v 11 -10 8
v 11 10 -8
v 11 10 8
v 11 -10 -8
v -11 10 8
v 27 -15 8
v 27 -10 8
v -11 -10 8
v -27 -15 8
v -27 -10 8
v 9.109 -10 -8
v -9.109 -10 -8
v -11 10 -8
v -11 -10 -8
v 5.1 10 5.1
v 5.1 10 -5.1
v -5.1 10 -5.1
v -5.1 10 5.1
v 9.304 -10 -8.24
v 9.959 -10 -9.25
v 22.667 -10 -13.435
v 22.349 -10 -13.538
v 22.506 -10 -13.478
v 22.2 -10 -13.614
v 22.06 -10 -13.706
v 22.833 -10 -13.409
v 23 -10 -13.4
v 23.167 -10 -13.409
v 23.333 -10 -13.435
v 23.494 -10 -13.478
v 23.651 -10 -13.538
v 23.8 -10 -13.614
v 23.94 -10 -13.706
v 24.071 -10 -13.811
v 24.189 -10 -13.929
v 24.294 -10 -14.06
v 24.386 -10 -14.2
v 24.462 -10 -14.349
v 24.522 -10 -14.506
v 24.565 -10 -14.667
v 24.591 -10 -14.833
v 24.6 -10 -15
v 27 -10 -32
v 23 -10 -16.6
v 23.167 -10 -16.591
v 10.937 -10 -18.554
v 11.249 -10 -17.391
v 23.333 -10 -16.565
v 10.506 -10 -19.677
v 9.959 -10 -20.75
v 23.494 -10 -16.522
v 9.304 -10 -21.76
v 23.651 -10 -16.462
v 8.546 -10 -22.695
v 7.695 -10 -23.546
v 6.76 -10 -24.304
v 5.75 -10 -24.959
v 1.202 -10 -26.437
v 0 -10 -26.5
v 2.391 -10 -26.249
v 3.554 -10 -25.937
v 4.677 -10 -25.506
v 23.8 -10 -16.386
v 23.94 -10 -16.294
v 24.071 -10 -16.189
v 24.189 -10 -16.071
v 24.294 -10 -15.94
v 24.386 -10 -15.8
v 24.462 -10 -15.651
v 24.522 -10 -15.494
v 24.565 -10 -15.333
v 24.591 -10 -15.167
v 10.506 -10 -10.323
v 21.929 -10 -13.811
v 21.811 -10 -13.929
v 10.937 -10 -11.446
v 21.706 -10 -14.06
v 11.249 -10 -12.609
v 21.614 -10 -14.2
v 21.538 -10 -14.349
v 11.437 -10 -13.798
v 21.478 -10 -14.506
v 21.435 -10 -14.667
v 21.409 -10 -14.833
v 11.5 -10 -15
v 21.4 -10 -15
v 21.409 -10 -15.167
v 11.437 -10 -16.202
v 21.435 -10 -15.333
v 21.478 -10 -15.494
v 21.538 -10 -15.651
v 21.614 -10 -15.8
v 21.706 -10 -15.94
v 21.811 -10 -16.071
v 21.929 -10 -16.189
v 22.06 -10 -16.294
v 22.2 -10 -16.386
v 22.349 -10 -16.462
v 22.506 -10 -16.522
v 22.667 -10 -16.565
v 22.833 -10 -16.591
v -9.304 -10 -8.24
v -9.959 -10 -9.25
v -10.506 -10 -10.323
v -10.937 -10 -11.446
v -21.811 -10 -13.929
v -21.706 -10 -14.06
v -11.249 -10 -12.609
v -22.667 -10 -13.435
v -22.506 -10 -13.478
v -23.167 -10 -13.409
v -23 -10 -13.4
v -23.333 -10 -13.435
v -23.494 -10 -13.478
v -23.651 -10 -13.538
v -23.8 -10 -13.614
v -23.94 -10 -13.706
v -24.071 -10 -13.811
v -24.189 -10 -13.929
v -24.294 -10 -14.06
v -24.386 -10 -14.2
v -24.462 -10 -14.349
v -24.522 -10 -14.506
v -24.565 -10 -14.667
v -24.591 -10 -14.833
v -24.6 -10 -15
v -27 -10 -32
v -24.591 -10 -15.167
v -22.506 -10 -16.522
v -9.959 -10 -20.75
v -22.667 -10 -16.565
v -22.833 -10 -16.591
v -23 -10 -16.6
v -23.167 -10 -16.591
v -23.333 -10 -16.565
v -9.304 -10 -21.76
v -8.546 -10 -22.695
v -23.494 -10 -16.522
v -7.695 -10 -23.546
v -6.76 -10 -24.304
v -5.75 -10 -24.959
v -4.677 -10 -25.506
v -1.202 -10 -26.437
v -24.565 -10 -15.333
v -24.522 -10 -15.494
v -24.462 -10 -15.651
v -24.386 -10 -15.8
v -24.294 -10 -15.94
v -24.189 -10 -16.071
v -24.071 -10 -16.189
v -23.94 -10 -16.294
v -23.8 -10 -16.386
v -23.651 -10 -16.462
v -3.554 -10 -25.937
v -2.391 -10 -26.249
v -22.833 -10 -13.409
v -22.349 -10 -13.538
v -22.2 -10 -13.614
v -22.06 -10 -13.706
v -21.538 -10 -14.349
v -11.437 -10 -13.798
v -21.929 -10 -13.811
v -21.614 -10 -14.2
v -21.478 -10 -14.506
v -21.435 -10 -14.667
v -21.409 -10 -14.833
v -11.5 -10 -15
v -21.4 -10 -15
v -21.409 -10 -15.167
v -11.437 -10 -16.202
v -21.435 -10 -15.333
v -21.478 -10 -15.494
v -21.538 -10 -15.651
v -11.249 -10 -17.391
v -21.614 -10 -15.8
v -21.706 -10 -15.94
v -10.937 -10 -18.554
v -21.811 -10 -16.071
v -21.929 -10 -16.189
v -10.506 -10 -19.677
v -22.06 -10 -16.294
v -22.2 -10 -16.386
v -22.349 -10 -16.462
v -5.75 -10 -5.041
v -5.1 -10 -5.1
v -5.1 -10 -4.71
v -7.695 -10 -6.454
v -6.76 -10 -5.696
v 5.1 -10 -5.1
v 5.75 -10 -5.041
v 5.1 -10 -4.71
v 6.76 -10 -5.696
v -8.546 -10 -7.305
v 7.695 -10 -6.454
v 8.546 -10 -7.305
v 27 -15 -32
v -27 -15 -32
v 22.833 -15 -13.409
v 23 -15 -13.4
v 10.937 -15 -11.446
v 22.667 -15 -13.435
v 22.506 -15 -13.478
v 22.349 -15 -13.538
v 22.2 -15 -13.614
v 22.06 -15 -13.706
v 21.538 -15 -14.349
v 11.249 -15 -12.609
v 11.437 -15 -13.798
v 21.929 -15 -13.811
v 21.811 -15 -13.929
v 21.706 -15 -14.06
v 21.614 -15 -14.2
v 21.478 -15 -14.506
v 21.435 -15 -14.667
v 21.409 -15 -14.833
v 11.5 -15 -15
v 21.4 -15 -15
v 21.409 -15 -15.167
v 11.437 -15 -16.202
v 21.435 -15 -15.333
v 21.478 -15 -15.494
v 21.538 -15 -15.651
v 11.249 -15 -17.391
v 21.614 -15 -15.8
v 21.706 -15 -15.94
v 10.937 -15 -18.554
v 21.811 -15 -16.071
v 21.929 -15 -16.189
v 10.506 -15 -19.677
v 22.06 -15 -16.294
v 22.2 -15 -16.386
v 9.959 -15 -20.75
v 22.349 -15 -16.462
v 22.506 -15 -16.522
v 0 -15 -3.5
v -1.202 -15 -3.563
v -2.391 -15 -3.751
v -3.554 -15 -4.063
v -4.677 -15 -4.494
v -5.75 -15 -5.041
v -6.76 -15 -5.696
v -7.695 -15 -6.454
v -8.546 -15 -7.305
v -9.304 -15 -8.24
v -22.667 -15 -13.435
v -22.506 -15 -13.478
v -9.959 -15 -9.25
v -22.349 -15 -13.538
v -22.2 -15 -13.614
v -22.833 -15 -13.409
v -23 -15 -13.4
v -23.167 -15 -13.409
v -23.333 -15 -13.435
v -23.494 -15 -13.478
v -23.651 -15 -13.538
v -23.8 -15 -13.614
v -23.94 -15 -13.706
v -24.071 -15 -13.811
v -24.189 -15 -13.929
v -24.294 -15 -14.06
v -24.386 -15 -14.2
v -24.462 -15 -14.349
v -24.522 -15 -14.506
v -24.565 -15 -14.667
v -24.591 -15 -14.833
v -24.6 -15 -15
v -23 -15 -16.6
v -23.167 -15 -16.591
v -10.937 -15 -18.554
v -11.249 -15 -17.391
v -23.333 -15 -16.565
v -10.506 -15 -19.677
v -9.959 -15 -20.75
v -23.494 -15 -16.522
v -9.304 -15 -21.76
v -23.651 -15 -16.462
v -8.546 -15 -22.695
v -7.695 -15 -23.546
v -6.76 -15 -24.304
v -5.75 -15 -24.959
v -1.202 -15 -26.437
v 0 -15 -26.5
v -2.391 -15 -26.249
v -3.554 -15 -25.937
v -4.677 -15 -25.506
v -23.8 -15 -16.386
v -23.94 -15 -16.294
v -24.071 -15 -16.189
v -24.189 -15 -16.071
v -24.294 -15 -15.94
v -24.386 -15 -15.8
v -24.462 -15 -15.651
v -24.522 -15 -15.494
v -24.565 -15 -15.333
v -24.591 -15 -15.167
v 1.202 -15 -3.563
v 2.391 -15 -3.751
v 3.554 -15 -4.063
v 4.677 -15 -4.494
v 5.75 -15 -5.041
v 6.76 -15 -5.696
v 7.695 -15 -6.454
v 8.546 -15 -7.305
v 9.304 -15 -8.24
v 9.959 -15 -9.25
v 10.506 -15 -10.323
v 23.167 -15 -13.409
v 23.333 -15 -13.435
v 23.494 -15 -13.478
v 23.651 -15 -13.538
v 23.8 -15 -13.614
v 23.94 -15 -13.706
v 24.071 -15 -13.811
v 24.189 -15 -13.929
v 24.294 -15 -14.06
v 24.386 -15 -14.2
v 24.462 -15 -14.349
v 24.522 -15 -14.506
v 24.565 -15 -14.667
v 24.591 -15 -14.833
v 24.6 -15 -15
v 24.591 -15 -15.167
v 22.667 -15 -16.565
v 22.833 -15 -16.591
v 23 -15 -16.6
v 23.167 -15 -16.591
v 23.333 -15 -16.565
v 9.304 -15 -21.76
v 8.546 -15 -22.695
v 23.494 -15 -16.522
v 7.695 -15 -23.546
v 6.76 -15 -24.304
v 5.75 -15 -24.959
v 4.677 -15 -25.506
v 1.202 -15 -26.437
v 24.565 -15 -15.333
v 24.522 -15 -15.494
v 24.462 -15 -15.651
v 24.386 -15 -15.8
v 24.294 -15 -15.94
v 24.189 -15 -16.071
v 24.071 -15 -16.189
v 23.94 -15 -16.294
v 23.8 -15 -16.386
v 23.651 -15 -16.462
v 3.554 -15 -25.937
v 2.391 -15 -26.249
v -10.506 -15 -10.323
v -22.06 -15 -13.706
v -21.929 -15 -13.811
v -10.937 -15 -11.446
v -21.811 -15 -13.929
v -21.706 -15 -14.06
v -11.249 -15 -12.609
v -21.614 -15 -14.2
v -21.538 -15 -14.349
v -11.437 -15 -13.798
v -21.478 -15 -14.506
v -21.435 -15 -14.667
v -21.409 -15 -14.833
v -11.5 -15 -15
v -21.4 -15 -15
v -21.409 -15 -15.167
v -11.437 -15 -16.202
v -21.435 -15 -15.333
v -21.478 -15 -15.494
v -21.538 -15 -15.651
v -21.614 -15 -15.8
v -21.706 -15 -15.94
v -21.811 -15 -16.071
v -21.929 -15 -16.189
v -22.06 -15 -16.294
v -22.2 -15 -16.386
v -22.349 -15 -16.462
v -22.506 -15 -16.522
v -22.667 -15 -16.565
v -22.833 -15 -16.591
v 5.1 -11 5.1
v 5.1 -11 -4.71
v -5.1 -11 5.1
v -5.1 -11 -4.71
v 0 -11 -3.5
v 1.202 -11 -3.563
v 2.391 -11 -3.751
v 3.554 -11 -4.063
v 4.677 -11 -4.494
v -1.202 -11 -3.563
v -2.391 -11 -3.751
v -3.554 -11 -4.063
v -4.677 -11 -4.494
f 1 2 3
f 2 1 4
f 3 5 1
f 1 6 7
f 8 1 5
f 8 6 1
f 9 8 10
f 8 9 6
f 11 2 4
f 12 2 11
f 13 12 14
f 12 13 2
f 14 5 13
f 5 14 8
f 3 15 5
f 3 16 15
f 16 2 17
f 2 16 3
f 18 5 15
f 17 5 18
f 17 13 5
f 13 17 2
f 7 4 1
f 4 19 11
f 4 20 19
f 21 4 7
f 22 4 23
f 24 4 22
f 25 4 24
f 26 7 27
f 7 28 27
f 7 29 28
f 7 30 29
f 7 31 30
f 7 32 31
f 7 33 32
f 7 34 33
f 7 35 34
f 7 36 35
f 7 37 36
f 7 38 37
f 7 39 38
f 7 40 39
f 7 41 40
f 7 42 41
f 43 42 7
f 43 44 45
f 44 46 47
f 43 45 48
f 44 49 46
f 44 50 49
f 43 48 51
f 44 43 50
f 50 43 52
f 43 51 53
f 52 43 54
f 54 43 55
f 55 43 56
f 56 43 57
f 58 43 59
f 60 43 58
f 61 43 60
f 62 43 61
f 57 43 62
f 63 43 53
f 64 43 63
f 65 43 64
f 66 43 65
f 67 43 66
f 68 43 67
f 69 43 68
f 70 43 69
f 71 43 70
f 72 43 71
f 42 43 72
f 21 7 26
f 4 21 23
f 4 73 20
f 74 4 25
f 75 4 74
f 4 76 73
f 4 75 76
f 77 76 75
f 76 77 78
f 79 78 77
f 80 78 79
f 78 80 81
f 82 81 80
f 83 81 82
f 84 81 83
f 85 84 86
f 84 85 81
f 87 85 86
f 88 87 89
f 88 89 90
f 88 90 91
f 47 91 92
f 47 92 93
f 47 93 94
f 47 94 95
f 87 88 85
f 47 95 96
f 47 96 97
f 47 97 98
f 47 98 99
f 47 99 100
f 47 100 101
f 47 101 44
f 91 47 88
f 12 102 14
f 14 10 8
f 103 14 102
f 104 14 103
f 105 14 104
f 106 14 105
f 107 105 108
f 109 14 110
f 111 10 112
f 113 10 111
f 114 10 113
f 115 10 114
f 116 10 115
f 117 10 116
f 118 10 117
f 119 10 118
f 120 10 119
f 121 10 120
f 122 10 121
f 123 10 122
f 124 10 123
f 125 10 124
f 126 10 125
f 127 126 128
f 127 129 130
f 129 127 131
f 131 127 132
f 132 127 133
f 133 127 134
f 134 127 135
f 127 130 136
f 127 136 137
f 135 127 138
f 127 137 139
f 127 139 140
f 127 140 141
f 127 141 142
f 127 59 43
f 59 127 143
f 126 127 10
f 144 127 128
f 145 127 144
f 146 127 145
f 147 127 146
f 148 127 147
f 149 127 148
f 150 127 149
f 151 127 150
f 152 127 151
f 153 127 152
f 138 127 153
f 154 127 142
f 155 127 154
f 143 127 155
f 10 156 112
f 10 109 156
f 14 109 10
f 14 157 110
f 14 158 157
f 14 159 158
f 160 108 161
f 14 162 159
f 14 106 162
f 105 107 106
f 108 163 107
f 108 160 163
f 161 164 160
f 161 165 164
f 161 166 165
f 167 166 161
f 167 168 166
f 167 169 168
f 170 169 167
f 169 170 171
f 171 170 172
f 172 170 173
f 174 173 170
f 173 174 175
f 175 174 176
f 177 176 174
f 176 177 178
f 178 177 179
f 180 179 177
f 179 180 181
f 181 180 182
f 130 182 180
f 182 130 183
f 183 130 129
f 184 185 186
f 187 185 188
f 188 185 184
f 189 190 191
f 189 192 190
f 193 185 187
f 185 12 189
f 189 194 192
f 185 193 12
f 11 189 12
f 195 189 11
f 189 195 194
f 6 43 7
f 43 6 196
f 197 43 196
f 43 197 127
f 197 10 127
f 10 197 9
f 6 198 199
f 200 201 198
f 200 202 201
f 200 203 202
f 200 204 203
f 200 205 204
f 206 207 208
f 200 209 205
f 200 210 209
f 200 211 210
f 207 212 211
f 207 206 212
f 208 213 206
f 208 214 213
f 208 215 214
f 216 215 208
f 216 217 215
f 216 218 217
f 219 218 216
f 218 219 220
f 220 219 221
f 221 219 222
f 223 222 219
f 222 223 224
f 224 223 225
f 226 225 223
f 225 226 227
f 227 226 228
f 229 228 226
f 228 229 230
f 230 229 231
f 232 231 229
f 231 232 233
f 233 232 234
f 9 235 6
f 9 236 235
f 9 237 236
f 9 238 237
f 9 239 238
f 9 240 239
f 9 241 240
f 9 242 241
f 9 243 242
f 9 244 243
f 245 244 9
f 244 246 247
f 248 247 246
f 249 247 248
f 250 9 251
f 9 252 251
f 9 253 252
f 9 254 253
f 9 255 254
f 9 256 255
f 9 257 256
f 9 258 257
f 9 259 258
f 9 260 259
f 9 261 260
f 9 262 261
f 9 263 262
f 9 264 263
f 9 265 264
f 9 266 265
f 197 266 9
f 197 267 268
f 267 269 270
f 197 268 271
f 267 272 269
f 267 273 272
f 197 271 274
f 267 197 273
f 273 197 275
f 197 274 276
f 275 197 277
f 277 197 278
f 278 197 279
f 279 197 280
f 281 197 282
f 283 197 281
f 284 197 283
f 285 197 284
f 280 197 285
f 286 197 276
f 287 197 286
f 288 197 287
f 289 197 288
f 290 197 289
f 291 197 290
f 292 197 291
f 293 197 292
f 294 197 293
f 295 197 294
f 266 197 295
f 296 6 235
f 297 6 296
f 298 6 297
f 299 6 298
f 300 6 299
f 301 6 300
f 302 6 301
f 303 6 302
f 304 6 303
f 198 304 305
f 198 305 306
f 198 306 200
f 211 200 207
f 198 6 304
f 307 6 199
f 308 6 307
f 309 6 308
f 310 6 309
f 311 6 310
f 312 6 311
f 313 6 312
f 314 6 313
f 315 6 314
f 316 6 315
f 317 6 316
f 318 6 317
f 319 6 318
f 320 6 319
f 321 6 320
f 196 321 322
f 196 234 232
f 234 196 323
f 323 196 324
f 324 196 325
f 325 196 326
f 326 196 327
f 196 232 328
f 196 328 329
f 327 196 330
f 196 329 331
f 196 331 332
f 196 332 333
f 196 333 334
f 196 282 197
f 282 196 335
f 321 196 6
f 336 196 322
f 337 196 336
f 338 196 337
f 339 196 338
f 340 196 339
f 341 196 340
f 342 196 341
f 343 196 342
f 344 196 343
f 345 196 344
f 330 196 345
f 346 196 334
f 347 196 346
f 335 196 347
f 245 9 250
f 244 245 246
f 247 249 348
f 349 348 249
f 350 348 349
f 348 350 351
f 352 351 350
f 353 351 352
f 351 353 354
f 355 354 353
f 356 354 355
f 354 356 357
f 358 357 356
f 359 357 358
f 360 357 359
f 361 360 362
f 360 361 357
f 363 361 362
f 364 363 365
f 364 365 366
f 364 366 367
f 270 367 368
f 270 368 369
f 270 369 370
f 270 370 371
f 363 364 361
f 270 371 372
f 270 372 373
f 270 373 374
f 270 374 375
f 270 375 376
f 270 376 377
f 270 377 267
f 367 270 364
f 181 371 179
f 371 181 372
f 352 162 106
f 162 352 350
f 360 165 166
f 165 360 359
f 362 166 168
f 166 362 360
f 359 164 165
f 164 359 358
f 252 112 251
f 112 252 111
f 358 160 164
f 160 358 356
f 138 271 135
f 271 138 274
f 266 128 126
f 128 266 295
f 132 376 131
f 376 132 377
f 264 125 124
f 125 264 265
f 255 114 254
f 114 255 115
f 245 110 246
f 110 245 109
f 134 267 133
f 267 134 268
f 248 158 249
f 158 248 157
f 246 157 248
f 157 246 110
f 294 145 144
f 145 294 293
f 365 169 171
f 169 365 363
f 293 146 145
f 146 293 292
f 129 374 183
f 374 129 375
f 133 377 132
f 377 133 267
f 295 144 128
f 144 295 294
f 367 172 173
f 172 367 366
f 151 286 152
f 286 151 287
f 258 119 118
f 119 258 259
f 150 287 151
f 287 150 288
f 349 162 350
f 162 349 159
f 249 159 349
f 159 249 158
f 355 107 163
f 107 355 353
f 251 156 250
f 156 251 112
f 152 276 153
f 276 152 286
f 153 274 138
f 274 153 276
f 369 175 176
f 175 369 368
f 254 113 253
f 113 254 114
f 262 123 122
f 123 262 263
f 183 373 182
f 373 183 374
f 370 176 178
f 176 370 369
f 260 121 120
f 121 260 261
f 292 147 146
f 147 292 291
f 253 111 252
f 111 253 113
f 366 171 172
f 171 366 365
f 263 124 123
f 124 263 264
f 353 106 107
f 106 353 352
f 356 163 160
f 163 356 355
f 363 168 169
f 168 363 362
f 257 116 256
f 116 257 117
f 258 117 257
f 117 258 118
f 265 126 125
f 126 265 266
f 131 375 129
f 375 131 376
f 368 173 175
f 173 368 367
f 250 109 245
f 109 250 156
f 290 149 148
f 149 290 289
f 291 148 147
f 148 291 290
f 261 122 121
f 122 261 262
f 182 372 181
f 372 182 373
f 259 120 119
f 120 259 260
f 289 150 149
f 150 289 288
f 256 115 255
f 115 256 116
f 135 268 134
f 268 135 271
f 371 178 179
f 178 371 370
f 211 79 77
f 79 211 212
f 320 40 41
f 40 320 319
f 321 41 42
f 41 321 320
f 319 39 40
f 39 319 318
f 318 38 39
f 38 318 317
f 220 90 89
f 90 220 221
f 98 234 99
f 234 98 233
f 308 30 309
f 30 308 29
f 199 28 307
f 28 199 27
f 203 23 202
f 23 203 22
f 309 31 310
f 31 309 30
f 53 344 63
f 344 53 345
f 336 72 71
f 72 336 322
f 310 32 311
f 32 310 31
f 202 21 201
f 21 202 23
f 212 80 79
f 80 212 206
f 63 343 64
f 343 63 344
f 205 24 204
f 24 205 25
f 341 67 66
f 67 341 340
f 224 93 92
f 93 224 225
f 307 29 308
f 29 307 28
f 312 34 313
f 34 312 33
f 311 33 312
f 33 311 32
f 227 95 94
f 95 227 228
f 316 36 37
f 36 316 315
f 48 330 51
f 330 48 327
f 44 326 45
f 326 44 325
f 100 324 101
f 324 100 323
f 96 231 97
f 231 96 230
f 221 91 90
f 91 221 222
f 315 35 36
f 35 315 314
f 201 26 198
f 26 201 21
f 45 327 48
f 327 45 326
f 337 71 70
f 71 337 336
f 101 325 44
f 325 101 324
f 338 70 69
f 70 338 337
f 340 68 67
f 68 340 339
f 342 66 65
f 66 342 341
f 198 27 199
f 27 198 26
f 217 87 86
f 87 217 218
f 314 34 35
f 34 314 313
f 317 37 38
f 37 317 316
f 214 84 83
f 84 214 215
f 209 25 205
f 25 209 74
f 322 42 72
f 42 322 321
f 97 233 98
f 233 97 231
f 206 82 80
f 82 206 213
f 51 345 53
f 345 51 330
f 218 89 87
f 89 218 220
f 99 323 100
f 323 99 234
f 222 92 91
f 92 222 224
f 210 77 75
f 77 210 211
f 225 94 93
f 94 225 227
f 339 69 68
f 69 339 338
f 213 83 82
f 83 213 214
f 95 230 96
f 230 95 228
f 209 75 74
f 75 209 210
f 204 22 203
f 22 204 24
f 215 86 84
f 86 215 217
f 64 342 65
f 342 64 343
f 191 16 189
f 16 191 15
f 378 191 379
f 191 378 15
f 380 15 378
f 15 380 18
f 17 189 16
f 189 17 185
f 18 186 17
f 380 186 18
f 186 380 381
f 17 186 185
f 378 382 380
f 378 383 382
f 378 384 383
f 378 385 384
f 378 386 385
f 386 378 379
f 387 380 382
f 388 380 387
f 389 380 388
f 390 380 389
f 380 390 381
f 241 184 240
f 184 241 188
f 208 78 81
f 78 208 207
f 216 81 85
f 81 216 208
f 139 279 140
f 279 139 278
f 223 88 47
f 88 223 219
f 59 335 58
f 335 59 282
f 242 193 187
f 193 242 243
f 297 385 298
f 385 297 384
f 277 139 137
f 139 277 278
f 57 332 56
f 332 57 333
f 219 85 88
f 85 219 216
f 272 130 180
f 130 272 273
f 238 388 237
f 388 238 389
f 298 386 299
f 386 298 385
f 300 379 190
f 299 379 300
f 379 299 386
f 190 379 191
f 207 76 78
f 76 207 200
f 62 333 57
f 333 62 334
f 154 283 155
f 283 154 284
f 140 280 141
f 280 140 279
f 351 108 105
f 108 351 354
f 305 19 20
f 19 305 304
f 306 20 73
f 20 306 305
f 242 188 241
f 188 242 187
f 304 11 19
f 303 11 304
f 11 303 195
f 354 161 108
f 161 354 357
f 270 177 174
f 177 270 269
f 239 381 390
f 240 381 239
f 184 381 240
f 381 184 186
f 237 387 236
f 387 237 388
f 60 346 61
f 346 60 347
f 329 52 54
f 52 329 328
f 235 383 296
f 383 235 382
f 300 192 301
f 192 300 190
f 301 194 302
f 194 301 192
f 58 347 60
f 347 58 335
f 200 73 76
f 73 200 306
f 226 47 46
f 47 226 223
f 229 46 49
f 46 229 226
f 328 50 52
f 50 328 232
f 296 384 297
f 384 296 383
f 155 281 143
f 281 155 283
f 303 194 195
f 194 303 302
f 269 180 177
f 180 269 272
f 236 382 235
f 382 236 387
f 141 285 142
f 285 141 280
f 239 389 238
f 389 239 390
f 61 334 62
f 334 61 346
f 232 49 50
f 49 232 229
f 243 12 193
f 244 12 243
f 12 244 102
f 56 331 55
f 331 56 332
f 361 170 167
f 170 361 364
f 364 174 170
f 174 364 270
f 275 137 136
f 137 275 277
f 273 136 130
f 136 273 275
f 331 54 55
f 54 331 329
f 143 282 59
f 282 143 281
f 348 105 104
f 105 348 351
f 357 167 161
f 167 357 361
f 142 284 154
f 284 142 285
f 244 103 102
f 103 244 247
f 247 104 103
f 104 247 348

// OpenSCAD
/* ==========================================================================
   PROJETO CAMPO TÁTIL - SUPORTE DO MOTOR Y (ENCAIXE NA BARRA 10x10)
   Desliza e trava na barra central 10x10. Segura o motor NEMA Y pelo parafuso.
   ========================================================================== */

$fn = 60;

eixo_quadrado_w = 10.2;  // Encaixe na barra da ponte (10mm + 0.2mm)
nema14_d = 36.5;         // Diâmetro do motor
furo_m3 = 3.2;           // Furo para parafusos M3 de fixação
furos_distancia = 46;    // Distância de 46mm entre centros dos furos M3 do NEMA 14 Redondo

module suporte_motor_y() {
    difference() {
        // 1. Corpo principal do suporte
        union() {
            // Bloco de encaixe da barra
            cube([22, 20, 16], center=true);
            
            // Placa vertical de suporte do motor que desce
            translate([0, -10 - 2.5, -12])
                cube([54, 5, 40], center=true); // Largura aumentada para 54mm
        }
        
        // 2. Canal Quadrado de Encaixe da Ponte 10x10 (Correndo ao longo de Y)
        cube([eixo_quadrado_w, 22, eixo_quadrado_w], center=true);
        
        // 3. Furos de montagem do Motor NEMA 14 (Na placa vertical)
        // Furo central do eixo do motor (23mm de diâmetro para colar de ressalto de 22mm)
        translate([0, -15, -15])
            rotate([90, 0, 0])
                cylinder(h = 10, r = 11.5, center=true); // Vão do colar central
        
        // Furos para os 2 parafusos M3 do NEMA 14 Redondo (Espaçamento de 46mm)
        for (x = [-furos_distancia/2, furos_distancia/2]) {
            translate([x, -10, -15])
                rotate([90, 0, 0])
                    cylinder(h = 10, r = furo_m3/2, center=true);
        }
    }
}

suporte_motor_y();
